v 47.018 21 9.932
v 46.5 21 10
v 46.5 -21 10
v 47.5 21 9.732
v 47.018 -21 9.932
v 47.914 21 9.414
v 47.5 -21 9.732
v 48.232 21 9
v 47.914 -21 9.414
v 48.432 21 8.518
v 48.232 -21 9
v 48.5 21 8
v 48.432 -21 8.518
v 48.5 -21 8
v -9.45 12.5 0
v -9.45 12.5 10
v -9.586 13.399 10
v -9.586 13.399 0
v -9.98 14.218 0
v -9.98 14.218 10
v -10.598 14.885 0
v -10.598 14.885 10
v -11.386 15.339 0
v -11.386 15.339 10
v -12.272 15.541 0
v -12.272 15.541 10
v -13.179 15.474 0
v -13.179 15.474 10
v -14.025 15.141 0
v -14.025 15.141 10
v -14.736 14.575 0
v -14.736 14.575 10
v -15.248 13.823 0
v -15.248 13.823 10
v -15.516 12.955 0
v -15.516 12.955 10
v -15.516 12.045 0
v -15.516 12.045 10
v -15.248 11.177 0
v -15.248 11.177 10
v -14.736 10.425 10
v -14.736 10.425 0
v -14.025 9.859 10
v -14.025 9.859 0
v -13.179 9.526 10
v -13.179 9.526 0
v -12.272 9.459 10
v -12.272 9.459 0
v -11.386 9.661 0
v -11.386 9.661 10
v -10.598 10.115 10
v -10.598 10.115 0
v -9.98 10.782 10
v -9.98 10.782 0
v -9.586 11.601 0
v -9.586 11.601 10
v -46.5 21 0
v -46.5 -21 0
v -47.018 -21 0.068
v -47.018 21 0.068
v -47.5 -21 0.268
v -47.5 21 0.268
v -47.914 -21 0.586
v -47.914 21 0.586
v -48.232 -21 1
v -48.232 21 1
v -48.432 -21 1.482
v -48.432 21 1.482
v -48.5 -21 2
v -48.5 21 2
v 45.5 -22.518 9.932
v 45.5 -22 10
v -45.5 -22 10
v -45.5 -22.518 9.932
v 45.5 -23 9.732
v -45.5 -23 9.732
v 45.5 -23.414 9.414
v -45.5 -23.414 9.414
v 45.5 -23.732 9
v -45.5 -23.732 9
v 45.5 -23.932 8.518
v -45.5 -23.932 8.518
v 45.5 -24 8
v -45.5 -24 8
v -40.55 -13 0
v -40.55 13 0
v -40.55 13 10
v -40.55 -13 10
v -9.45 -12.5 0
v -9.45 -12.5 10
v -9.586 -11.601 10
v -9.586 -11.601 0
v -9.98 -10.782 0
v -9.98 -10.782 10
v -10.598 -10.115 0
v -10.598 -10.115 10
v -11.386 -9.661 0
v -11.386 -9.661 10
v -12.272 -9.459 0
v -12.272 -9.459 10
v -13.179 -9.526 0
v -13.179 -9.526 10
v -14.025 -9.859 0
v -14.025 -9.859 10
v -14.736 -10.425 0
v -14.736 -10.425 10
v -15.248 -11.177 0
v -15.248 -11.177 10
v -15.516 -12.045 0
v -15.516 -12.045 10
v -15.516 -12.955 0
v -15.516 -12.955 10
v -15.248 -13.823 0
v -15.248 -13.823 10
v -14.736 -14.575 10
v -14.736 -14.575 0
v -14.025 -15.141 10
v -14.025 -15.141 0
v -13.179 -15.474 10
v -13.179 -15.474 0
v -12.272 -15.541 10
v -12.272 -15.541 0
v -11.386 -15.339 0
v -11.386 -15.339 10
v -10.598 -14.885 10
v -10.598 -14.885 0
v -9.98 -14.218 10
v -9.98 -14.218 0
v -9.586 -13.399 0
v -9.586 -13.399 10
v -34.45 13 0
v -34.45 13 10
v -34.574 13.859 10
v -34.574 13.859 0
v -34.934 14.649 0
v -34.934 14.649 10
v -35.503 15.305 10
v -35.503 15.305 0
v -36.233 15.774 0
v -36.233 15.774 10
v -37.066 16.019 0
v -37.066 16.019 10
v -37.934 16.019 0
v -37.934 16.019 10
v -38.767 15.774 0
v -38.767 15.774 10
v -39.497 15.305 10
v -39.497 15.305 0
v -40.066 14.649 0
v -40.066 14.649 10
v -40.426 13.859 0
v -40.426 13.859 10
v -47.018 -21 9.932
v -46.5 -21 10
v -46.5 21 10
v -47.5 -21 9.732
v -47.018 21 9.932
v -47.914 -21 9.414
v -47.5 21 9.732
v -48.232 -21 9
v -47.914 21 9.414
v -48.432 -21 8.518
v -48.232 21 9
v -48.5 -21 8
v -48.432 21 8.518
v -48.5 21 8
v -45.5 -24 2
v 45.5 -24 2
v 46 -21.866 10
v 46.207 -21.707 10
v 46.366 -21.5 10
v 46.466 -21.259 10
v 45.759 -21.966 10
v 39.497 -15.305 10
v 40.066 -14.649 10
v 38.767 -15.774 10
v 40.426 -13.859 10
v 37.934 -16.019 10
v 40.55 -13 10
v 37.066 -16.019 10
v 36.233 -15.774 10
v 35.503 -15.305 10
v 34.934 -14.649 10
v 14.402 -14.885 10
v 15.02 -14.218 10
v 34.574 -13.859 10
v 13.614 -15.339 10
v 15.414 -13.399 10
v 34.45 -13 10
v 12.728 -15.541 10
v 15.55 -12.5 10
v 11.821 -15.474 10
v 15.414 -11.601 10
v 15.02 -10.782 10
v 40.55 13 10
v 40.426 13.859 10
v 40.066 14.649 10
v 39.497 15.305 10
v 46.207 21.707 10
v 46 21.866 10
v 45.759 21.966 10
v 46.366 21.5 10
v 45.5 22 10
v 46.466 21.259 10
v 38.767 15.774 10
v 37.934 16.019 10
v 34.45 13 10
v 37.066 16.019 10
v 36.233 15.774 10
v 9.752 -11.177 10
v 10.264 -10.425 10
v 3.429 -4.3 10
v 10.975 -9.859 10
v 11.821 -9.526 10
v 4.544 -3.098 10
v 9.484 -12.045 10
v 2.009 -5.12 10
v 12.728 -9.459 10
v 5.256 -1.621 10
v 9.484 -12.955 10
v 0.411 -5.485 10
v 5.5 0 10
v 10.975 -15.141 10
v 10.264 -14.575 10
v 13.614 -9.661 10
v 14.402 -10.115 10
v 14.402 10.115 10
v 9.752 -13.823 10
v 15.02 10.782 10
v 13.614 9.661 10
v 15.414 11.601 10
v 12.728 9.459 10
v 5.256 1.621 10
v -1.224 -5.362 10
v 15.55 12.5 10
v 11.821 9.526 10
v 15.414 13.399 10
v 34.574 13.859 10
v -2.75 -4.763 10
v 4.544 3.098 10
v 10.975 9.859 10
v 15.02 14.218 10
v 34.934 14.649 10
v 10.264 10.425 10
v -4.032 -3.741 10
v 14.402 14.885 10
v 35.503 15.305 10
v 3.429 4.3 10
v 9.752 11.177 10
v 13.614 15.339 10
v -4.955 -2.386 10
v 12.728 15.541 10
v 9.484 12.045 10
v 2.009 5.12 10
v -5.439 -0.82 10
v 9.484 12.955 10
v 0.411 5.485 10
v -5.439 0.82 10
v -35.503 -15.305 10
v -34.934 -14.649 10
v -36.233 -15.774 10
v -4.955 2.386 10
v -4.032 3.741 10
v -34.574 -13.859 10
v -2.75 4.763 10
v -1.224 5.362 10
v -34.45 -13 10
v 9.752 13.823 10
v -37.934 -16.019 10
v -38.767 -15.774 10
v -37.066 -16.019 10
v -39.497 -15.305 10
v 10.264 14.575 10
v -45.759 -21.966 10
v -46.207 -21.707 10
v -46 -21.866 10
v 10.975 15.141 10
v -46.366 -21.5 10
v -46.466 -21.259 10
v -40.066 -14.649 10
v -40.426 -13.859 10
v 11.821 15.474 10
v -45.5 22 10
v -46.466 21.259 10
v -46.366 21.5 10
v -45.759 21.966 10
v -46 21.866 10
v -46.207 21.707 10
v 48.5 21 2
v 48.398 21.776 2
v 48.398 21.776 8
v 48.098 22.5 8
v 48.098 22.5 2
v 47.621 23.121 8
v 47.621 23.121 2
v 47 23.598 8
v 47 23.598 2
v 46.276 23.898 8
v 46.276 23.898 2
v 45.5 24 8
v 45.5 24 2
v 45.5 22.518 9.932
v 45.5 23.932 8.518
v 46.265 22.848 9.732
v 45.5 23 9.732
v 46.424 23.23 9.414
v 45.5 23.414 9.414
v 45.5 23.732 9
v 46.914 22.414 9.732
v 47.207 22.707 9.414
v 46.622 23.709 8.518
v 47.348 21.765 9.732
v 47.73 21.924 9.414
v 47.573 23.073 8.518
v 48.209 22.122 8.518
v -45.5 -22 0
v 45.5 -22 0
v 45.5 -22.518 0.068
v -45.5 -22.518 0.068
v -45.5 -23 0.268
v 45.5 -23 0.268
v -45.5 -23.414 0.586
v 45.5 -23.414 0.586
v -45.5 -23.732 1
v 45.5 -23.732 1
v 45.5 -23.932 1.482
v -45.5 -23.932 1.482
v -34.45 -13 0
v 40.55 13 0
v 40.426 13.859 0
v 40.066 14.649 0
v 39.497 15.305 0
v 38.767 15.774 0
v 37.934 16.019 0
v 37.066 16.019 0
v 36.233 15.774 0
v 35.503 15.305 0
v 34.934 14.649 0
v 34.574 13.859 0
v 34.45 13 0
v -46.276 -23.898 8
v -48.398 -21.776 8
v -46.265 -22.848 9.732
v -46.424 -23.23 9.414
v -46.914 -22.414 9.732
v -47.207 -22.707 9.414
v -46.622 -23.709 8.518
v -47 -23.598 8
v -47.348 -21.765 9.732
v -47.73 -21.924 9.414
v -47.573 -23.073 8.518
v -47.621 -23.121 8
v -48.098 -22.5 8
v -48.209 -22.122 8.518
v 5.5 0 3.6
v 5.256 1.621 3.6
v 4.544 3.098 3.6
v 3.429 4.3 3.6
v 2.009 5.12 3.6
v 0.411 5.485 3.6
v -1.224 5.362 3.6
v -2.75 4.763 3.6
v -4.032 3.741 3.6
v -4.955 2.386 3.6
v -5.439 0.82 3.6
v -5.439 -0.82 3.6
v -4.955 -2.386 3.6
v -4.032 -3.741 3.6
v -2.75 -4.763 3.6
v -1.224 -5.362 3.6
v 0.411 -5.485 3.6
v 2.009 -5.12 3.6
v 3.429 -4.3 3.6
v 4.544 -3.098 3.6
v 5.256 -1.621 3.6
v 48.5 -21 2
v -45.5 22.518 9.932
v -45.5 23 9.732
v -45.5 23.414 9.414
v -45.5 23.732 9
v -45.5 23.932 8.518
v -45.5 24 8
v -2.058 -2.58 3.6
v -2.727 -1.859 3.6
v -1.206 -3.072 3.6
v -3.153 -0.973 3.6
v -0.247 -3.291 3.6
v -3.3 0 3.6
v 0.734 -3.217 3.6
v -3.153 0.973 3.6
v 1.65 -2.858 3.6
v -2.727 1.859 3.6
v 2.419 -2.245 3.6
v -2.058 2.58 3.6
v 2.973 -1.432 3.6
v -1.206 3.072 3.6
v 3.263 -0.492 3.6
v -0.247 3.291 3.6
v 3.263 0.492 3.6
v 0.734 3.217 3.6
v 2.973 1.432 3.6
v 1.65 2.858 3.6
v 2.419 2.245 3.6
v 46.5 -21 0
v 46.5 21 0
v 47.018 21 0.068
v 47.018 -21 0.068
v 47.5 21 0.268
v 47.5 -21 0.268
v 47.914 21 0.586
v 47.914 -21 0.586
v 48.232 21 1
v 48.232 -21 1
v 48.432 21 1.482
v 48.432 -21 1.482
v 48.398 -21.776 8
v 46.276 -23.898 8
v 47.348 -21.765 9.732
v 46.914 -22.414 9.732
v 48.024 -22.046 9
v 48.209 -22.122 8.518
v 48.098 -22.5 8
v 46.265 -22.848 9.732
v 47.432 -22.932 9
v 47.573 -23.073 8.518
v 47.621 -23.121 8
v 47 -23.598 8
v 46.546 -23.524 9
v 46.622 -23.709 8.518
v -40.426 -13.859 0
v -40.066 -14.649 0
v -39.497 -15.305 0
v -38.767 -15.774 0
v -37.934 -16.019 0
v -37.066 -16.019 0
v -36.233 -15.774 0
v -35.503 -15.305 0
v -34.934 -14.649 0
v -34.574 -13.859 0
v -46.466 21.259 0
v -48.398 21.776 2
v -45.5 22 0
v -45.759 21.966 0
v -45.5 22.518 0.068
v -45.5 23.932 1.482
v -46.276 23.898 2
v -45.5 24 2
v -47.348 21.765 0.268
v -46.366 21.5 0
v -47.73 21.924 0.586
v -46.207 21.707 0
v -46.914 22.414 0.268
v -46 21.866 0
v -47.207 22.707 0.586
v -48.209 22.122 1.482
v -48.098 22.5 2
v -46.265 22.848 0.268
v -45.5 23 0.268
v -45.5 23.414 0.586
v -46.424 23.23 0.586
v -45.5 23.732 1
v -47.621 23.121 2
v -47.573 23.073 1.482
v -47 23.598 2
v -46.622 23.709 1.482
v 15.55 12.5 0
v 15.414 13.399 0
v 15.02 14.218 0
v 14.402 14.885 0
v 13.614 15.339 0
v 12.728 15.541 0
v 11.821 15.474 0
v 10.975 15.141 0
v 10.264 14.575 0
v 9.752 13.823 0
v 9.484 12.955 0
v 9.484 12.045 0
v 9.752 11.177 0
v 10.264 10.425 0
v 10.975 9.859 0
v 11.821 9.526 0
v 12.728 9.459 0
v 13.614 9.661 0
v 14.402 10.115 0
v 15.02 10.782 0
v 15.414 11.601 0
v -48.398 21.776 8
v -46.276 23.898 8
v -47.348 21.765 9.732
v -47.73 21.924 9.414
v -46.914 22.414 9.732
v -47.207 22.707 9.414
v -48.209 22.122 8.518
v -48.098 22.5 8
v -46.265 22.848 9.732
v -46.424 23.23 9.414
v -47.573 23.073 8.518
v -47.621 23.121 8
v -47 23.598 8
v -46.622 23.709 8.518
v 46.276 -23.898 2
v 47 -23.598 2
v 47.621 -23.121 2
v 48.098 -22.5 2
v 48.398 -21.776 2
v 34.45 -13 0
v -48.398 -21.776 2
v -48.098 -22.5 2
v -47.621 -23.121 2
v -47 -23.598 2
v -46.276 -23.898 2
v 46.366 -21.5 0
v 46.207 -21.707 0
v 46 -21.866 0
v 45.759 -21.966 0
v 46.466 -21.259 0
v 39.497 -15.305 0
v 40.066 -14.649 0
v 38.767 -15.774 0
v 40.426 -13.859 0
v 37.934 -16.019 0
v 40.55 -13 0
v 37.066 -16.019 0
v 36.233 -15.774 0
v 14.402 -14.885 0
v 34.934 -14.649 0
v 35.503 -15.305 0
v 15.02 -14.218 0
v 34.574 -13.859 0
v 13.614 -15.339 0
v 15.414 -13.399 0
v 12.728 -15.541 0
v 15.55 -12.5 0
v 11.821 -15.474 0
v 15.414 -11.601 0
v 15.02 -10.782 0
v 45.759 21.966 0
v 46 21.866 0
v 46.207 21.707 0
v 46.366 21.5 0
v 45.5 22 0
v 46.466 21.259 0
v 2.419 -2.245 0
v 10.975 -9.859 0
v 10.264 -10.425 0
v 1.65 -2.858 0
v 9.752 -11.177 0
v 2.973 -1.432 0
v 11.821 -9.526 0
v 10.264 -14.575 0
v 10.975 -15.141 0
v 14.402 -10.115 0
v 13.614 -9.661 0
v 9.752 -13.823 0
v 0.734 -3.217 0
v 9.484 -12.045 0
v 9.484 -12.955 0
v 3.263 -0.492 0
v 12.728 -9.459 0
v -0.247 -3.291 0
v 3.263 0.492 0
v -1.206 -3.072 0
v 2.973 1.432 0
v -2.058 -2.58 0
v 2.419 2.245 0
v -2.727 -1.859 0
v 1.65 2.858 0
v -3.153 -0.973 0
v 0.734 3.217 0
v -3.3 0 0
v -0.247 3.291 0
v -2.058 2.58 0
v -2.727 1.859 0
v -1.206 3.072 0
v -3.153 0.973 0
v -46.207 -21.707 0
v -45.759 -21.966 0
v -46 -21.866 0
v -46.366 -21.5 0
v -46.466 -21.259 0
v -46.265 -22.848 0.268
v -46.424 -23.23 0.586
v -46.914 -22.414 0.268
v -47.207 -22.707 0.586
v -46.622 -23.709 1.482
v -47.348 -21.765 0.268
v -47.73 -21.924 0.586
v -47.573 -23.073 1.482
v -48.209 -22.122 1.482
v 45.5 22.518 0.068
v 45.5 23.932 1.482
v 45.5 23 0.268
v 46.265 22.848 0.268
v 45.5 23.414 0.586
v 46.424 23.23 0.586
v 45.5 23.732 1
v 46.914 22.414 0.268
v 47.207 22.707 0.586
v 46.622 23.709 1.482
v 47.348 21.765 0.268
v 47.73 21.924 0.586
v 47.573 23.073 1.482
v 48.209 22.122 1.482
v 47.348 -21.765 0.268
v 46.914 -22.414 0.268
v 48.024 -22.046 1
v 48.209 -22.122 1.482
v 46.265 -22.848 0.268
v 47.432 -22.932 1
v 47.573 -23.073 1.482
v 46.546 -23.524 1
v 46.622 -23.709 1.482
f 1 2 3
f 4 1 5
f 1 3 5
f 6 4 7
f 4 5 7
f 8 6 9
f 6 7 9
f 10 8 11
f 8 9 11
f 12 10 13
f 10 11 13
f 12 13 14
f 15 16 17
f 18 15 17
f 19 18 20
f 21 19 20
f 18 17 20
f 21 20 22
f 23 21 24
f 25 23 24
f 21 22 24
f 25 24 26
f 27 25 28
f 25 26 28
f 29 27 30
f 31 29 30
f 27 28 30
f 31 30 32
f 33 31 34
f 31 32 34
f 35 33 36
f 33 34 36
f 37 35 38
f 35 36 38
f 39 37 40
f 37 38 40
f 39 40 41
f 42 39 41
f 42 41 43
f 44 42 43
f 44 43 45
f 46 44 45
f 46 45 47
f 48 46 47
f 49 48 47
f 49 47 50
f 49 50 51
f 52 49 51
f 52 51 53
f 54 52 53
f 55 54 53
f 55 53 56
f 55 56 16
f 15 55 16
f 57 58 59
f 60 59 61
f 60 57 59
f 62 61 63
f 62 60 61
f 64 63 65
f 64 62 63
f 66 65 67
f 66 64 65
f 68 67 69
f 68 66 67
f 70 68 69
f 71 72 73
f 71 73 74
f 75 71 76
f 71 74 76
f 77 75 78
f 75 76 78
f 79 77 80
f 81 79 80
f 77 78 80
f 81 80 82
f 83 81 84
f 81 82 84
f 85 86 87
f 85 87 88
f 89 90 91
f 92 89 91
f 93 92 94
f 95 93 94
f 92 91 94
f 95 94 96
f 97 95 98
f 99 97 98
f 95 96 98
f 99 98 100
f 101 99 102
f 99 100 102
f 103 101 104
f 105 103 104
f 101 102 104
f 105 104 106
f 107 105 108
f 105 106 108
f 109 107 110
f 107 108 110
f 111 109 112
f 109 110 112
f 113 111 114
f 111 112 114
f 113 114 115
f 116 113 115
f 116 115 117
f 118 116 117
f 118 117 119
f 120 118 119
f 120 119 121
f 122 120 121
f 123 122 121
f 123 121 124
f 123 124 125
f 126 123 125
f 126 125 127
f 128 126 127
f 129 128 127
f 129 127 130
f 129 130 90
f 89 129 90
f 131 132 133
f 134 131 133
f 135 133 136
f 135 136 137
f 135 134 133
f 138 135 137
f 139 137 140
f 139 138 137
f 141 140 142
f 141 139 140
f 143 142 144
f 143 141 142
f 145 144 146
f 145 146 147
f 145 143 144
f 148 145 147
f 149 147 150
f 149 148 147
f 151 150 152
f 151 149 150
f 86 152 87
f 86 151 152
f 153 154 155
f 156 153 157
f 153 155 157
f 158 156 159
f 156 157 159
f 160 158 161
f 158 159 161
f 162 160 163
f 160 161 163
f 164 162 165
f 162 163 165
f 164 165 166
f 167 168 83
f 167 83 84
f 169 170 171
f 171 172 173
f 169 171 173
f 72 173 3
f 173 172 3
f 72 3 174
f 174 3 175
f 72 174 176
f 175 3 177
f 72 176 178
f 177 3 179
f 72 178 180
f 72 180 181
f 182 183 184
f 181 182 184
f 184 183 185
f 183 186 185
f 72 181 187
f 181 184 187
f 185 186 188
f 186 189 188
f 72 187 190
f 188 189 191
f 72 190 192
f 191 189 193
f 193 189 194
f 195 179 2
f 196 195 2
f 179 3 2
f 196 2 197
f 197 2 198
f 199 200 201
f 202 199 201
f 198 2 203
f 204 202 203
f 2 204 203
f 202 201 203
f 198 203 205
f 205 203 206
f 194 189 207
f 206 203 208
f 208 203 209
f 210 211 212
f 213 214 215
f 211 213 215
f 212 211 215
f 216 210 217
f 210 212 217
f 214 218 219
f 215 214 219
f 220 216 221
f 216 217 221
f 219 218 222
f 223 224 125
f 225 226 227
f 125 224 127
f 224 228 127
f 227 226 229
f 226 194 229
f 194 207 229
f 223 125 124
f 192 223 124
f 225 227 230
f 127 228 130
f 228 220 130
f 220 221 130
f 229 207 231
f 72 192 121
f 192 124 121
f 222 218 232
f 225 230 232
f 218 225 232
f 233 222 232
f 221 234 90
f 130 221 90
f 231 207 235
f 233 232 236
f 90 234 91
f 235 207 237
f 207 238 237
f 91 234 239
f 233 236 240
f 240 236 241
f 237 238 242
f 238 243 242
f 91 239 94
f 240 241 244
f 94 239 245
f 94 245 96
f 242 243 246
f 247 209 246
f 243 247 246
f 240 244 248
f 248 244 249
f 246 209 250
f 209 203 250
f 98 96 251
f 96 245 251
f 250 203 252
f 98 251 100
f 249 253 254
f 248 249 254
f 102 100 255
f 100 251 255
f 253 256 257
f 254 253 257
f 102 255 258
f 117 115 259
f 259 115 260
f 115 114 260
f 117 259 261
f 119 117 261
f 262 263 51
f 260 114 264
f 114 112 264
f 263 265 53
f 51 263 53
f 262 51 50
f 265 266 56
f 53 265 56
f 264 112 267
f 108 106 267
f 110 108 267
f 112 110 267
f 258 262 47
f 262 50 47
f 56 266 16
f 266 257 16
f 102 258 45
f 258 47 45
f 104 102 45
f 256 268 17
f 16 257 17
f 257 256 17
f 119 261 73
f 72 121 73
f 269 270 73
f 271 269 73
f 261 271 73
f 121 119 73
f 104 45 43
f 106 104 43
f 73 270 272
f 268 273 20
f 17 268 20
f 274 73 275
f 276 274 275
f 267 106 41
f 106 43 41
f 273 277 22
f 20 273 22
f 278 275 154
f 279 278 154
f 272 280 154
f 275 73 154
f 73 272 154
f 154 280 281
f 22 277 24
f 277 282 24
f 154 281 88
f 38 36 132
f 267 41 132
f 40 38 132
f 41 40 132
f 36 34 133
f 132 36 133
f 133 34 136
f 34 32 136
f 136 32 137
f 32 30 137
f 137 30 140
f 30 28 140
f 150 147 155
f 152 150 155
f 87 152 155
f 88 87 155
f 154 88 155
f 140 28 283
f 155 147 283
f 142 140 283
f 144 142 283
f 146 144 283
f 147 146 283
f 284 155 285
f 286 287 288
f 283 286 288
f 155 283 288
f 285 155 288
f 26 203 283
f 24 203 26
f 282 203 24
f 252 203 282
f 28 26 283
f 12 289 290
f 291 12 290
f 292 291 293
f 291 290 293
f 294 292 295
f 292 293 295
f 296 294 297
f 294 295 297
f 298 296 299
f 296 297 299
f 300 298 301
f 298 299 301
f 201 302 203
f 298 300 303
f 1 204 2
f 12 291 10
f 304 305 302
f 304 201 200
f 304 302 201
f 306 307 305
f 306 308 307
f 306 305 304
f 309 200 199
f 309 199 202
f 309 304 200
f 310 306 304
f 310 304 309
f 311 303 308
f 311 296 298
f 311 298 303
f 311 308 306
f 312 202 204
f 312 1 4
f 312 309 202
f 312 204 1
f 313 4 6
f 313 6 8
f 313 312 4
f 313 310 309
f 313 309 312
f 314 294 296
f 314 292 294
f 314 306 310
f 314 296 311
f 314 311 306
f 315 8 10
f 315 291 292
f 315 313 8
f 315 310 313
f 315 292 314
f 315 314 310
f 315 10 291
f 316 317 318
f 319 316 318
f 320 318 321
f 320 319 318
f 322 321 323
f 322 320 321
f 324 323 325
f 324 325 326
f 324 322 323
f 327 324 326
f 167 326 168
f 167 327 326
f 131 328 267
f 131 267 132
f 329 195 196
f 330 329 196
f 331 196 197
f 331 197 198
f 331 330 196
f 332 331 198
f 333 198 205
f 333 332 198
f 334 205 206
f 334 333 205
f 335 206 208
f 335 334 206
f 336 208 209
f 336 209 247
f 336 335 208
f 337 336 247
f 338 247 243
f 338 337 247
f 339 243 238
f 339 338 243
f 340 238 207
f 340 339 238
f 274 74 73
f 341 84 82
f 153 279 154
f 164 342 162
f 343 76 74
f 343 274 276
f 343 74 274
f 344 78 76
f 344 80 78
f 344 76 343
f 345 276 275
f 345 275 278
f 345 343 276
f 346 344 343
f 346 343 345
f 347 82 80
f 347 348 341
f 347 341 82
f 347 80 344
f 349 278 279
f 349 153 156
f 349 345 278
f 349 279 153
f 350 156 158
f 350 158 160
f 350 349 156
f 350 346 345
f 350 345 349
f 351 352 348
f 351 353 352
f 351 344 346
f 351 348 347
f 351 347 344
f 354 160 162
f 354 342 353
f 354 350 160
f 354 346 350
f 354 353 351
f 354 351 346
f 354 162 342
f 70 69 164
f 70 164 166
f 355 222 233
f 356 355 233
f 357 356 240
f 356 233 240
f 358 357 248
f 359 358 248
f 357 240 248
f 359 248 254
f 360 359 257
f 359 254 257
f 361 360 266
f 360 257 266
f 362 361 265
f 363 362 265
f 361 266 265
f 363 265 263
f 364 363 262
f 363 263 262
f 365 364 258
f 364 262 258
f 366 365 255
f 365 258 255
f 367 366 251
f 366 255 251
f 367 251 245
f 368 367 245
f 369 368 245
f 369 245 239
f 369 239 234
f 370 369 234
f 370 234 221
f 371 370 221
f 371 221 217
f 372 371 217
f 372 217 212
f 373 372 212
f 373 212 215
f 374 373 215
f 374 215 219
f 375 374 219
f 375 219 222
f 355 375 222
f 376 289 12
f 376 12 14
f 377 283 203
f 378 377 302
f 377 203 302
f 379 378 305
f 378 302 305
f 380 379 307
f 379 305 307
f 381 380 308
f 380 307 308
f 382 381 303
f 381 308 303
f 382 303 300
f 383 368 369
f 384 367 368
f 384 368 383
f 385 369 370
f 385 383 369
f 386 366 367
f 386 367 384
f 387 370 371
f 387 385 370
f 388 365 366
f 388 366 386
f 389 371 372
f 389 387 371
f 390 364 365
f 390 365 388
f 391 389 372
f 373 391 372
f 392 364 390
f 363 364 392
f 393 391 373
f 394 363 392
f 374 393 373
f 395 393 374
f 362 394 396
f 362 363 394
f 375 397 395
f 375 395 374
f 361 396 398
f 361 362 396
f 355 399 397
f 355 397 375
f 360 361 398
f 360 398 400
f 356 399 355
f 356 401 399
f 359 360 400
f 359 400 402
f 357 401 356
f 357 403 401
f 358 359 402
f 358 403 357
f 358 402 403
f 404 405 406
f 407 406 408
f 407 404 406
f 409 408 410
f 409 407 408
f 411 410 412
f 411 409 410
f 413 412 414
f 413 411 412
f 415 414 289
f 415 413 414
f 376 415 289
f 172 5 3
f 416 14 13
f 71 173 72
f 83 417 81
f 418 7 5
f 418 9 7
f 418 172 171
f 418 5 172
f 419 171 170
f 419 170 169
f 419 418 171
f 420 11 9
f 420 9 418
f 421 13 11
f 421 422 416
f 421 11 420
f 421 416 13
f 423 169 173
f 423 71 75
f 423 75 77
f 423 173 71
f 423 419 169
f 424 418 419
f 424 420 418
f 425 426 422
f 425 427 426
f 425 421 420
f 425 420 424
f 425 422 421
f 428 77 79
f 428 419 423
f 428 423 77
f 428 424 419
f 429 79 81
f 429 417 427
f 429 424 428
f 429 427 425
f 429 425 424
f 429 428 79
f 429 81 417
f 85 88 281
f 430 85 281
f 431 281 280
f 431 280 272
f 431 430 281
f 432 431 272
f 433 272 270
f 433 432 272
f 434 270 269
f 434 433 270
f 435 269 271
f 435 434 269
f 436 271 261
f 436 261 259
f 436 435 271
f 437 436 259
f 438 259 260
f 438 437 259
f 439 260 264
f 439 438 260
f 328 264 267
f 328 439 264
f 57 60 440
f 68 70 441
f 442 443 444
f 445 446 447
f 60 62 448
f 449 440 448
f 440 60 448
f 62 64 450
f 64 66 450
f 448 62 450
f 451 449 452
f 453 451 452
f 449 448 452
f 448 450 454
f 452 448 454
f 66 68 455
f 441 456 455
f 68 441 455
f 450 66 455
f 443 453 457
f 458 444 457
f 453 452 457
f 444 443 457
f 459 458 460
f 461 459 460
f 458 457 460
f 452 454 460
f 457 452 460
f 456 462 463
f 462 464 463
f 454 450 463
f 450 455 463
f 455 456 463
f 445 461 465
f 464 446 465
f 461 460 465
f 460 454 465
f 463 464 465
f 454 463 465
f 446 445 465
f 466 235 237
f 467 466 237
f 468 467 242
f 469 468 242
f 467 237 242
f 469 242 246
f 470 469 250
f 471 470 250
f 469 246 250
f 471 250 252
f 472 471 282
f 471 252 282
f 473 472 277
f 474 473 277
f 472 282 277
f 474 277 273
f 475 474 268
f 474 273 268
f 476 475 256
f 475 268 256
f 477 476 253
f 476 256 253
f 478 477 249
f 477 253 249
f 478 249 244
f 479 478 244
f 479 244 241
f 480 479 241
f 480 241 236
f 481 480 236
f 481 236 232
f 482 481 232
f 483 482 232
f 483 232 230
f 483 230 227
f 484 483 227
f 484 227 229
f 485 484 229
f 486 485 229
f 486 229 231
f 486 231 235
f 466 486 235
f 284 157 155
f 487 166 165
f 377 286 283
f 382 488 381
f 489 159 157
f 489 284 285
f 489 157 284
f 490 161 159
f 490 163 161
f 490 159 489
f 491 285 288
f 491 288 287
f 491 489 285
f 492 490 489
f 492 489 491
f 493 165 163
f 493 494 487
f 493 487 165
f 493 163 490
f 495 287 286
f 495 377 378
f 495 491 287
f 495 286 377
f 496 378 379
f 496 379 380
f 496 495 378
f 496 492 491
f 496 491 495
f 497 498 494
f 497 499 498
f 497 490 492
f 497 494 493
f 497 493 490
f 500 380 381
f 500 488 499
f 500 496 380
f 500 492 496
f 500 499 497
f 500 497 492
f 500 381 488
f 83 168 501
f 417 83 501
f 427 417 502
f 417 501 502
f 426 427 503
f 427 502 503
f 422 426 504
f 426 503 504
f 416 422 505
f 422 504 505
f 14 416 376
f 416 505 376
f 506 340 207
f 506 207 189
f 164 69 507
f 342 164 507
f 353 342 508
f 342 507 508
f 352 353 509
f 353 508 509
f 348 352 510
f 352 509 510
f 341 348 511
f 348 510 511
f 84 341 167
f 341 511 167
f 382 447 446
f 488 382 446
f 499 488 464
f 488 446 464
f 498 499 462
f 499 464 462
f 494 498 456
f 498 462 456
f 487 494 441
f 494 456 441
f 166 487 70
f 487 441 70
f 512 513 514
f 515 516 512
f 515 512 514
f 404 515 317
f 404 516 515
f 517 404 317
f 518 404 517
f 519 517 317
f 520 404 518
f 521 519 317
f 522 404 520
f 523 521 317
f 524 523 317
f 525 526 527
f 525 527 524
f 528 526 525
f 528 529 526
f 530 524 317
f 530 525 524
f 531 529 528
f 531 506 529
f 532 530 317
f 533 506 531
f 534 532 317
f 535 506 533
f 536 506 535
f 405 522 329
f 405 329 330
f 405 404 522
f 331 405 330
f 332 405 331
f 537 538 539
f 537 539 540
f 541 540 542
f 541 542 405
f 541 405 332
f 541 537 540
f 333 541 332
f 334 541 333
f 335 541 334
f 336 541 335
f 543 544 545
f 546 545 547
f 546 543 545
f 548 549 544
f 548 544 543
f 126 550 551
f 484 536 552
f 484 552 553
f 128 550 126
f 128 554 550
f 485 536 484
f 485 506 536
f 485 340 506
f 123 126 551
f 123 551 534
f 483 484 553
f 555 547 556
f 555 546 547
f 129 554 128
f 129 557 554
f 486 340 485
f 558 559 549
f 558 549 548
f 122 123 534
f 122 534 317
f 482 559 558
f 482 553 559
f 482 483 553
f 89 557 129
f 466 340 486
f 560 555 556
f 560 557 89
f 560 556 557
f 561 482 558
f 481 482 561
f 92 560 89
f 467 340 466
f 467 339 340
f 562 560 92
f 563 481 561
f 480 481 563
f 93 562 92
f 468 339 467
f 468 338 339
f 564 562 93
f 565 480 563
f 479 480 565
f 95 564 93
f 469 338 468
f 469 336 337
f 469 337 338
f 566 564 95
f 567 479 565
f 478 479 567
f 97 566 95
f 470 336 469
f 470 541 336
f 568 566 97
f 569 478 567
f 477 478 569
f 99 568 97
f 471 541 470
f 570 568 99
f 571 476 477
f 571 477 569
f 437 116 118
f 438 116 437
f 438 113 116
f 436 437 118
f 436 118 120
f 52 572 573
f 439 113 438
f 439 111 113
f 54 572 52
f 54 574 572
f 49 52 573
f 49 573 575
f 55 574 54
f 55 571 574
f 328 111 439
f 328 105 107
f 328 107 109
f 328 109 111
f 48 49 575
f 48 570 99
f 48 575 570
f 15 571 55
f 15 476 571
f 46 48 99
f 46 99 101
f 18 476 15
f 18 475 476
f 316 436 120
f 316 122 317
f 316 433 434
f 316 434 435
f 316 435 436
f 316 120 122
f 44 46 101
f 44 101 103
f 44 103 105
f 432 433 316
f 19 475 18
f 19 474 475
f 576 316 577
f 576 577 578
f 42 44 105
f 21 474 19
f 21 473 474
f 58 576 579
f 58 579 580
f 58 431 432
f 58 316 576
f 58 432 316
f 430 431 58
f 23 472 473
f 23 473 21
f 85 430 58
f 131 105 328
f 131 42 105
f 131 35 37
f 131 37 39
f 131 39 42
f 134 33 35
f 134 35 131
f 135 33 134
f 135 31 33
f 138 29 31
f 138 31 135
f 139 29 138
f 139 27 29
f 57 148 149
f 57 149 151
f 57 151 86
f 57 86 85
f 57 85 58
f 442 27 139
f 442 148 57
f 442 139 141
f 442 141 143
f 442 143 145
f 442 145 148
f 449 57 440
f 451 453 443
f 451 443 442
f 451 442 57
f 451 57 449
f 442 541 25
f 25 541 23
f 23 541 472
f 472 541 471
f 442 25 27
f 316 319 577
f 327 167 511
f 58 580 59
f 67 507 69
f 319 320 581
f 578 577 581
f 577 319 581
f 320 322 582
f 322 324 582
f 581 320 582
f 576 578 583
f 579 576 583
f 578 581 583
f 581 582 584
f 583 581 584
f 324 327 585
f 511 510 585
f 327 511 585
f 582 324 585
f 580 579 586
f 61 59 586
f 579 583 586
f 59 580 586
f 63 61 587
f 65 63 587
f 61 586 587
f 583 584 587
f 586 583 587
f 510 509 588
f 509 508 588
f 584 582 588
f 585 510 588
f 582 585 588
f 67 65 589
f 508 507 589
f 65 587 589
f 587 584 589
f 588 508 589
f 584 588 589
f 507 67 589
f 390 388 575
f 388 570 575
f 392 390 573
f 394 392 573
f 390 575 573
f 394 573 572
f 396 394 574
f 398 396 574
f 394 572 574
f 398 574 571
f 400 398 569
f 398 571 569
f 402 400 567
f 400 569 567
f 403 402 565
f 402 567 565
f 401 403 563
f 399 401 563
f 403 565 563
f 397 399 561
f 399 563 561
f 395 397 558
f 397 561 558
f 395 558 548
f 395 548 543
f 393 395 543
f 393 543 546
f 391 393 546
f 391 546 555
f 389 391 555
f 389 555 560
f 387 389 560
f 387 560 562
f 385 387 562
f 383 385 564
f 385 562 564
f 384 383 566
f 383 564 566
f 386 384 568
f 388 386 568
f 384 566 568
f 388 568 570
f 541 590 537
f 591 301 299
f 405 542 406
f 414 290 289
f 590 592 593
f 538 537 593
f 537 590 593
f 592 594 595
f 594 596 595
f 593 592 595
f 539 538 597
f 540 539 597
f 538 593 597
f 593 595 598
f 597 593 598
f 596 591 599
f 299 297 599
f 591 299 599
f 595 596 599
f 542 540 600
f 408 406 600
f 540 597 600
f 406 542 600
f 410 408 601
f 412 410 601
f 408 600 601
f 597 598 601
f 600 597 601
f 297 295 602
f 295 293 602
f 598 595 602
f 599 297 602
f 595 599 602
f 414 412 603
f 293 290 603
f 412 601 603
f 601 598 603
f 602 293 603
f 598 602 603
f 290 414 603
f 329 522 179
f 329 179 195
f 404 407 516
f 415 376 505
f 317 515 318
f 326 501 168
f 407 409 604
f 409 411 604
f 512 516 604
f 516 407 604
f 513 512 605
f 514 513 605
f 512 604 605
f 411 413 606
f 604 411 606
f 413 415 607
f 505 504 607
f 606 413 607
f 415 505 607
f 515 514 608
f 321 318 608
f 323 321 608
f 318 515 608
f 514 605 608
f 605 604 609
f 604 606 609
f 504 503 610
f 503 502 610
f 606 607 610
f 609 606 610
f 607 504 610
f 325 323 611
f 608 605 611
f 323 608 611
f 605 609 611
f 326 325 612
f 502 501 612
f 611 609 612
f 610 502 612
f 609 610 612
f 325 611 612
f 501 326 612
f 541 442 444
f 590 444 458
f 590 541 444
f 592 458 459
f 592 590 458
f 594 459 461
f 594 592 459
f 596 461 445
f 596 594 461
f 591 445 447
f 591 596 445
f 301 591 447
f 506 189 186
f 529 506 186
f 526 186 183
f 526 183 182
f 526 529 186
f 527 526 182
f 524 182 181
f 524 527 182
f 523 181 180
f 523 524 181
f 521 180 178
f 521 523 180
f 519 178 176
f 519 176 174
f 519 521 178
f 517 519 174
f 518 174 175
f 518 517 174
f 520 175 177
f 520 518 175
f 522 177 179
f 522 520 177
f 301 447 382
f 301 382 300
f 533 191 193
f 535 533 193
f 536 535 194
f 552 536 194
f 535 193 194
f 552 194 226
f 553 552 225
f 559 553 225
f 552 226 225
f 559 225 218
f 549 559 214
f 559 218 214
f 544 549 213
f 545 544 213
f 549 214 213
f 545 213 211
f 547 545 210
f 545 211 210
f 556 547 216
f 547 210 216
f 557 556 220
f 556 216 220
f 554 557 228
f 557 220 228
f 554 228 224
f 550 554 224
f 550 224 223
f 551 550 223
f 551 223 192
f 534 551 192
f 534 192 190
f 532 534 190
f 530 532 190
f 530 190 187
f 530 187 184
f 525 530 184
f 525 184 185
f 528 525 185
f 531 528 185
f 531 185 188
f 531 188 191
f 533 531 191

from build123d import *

# Parameters (mm, degrees)
PAD_DEPTH        = 10
SKETCH001_R      = 3.05
POCKET_DEPTH     = 10.001
FILLET_R         = 2
FILLET001_R      = 2
HOLE_D           = 6.6
HOLE_DEPTH       = 25
HOLE_CBORE_D     = 11
HOLE_CBORE_DEPTH = 6.4


with BuildPart() as part:
    # Sketch → Pad (new body)
    with BuildSketch(Plane.XY):
        with BuildLine():
            Line((-45.5, 24), (45.5, 24))
            ThreePointArc((48.5, 21), (47.62132, 23.12132), (45.5, 24))
            Line((48.5, 21), (48.5, -21))
            ThreePointArc((45.5, -24), (47.62132, -23.12132), (48.5, -21))
            Line((45.5, -24), (-45.5, -24))
            ThreePointArc((-48.5, -21), (-47.62132, -23.12132), (-45.5, -24))
            Line((-48.5, -21), (-48.5, 21))
            ThreePointArc((-45.5, 24), (-47.62132, 23.12132), (-48.5, 21))
        make_face()
        with BuildLine():
            ThreePointArc((40.55, 13), (37.5, 16.05), (34.45, 13))
            Line((34.45, 13), (34.45, -13))
            ThreePointArc((34.45, -13), (37.5, -16.05), (40.55, -13))
            Line((40.55, -13), (40.55, 13))
        make_face(mode=Mode.SUBTRACT)
        with BuildLine():
            ThreePointArc((-34.45, 13), (-37.5, 16.05), (-40.55, 13))
            Line((-40.55, 13), (-40.55, -13))
            ThreePointArc((-40.55, -13), (-37.5, -16.05), (-34.45, -13))
            Line((-34.45, -13), (-34.45, 13))
        make_face(mode=Mode.SUBTRACT)
    extrude(amount=PAD_DEPTH)

    # Sketch001 (on Face18 of Pad) → Pocket (cut, through all)
    with BuildSketch(Plane.XY.offset(10)):
        with Locations((-12.5, 12.5)):
            Circle(SKETCH001_R)
        with Locations((12.5, 12.5)):
            Circle(SKETCH001_R)
        with Locations((-12.5, -12.5)):
            Circle(SKETCH001_R)
        with Locations((12.5, -12.5)):
            Circle(SKETCH001_R)
    extrude(amount=-POCKET_DEPTH, mode=Mode.SUBTRACT)

    # Fillet
    fillet_edges = [part.edges().sort_by_distance(p)[0] for p in [
        (0, -24, 10),
    ]]
    fillet(fillet_edges, radius=FILLET_R)

    # Fillet001
    fillet001_edges = [part.edges().sort_by_distance(p)[0] for p in [
        (0, -24, 0),
    ]]
    fillet(fillet001_edges, radius=FILLET001_R)

    # Hole
    with Locations(Plane.XY.offset(10)):
        with Locations((0, 0)):
            CounterBoreHole(HOLE_D / 2, HOLE_CBORE_D / 2, HOLE_CBORE_DEPTH, depth=HOLE_DEPTH)


solid = part.part
